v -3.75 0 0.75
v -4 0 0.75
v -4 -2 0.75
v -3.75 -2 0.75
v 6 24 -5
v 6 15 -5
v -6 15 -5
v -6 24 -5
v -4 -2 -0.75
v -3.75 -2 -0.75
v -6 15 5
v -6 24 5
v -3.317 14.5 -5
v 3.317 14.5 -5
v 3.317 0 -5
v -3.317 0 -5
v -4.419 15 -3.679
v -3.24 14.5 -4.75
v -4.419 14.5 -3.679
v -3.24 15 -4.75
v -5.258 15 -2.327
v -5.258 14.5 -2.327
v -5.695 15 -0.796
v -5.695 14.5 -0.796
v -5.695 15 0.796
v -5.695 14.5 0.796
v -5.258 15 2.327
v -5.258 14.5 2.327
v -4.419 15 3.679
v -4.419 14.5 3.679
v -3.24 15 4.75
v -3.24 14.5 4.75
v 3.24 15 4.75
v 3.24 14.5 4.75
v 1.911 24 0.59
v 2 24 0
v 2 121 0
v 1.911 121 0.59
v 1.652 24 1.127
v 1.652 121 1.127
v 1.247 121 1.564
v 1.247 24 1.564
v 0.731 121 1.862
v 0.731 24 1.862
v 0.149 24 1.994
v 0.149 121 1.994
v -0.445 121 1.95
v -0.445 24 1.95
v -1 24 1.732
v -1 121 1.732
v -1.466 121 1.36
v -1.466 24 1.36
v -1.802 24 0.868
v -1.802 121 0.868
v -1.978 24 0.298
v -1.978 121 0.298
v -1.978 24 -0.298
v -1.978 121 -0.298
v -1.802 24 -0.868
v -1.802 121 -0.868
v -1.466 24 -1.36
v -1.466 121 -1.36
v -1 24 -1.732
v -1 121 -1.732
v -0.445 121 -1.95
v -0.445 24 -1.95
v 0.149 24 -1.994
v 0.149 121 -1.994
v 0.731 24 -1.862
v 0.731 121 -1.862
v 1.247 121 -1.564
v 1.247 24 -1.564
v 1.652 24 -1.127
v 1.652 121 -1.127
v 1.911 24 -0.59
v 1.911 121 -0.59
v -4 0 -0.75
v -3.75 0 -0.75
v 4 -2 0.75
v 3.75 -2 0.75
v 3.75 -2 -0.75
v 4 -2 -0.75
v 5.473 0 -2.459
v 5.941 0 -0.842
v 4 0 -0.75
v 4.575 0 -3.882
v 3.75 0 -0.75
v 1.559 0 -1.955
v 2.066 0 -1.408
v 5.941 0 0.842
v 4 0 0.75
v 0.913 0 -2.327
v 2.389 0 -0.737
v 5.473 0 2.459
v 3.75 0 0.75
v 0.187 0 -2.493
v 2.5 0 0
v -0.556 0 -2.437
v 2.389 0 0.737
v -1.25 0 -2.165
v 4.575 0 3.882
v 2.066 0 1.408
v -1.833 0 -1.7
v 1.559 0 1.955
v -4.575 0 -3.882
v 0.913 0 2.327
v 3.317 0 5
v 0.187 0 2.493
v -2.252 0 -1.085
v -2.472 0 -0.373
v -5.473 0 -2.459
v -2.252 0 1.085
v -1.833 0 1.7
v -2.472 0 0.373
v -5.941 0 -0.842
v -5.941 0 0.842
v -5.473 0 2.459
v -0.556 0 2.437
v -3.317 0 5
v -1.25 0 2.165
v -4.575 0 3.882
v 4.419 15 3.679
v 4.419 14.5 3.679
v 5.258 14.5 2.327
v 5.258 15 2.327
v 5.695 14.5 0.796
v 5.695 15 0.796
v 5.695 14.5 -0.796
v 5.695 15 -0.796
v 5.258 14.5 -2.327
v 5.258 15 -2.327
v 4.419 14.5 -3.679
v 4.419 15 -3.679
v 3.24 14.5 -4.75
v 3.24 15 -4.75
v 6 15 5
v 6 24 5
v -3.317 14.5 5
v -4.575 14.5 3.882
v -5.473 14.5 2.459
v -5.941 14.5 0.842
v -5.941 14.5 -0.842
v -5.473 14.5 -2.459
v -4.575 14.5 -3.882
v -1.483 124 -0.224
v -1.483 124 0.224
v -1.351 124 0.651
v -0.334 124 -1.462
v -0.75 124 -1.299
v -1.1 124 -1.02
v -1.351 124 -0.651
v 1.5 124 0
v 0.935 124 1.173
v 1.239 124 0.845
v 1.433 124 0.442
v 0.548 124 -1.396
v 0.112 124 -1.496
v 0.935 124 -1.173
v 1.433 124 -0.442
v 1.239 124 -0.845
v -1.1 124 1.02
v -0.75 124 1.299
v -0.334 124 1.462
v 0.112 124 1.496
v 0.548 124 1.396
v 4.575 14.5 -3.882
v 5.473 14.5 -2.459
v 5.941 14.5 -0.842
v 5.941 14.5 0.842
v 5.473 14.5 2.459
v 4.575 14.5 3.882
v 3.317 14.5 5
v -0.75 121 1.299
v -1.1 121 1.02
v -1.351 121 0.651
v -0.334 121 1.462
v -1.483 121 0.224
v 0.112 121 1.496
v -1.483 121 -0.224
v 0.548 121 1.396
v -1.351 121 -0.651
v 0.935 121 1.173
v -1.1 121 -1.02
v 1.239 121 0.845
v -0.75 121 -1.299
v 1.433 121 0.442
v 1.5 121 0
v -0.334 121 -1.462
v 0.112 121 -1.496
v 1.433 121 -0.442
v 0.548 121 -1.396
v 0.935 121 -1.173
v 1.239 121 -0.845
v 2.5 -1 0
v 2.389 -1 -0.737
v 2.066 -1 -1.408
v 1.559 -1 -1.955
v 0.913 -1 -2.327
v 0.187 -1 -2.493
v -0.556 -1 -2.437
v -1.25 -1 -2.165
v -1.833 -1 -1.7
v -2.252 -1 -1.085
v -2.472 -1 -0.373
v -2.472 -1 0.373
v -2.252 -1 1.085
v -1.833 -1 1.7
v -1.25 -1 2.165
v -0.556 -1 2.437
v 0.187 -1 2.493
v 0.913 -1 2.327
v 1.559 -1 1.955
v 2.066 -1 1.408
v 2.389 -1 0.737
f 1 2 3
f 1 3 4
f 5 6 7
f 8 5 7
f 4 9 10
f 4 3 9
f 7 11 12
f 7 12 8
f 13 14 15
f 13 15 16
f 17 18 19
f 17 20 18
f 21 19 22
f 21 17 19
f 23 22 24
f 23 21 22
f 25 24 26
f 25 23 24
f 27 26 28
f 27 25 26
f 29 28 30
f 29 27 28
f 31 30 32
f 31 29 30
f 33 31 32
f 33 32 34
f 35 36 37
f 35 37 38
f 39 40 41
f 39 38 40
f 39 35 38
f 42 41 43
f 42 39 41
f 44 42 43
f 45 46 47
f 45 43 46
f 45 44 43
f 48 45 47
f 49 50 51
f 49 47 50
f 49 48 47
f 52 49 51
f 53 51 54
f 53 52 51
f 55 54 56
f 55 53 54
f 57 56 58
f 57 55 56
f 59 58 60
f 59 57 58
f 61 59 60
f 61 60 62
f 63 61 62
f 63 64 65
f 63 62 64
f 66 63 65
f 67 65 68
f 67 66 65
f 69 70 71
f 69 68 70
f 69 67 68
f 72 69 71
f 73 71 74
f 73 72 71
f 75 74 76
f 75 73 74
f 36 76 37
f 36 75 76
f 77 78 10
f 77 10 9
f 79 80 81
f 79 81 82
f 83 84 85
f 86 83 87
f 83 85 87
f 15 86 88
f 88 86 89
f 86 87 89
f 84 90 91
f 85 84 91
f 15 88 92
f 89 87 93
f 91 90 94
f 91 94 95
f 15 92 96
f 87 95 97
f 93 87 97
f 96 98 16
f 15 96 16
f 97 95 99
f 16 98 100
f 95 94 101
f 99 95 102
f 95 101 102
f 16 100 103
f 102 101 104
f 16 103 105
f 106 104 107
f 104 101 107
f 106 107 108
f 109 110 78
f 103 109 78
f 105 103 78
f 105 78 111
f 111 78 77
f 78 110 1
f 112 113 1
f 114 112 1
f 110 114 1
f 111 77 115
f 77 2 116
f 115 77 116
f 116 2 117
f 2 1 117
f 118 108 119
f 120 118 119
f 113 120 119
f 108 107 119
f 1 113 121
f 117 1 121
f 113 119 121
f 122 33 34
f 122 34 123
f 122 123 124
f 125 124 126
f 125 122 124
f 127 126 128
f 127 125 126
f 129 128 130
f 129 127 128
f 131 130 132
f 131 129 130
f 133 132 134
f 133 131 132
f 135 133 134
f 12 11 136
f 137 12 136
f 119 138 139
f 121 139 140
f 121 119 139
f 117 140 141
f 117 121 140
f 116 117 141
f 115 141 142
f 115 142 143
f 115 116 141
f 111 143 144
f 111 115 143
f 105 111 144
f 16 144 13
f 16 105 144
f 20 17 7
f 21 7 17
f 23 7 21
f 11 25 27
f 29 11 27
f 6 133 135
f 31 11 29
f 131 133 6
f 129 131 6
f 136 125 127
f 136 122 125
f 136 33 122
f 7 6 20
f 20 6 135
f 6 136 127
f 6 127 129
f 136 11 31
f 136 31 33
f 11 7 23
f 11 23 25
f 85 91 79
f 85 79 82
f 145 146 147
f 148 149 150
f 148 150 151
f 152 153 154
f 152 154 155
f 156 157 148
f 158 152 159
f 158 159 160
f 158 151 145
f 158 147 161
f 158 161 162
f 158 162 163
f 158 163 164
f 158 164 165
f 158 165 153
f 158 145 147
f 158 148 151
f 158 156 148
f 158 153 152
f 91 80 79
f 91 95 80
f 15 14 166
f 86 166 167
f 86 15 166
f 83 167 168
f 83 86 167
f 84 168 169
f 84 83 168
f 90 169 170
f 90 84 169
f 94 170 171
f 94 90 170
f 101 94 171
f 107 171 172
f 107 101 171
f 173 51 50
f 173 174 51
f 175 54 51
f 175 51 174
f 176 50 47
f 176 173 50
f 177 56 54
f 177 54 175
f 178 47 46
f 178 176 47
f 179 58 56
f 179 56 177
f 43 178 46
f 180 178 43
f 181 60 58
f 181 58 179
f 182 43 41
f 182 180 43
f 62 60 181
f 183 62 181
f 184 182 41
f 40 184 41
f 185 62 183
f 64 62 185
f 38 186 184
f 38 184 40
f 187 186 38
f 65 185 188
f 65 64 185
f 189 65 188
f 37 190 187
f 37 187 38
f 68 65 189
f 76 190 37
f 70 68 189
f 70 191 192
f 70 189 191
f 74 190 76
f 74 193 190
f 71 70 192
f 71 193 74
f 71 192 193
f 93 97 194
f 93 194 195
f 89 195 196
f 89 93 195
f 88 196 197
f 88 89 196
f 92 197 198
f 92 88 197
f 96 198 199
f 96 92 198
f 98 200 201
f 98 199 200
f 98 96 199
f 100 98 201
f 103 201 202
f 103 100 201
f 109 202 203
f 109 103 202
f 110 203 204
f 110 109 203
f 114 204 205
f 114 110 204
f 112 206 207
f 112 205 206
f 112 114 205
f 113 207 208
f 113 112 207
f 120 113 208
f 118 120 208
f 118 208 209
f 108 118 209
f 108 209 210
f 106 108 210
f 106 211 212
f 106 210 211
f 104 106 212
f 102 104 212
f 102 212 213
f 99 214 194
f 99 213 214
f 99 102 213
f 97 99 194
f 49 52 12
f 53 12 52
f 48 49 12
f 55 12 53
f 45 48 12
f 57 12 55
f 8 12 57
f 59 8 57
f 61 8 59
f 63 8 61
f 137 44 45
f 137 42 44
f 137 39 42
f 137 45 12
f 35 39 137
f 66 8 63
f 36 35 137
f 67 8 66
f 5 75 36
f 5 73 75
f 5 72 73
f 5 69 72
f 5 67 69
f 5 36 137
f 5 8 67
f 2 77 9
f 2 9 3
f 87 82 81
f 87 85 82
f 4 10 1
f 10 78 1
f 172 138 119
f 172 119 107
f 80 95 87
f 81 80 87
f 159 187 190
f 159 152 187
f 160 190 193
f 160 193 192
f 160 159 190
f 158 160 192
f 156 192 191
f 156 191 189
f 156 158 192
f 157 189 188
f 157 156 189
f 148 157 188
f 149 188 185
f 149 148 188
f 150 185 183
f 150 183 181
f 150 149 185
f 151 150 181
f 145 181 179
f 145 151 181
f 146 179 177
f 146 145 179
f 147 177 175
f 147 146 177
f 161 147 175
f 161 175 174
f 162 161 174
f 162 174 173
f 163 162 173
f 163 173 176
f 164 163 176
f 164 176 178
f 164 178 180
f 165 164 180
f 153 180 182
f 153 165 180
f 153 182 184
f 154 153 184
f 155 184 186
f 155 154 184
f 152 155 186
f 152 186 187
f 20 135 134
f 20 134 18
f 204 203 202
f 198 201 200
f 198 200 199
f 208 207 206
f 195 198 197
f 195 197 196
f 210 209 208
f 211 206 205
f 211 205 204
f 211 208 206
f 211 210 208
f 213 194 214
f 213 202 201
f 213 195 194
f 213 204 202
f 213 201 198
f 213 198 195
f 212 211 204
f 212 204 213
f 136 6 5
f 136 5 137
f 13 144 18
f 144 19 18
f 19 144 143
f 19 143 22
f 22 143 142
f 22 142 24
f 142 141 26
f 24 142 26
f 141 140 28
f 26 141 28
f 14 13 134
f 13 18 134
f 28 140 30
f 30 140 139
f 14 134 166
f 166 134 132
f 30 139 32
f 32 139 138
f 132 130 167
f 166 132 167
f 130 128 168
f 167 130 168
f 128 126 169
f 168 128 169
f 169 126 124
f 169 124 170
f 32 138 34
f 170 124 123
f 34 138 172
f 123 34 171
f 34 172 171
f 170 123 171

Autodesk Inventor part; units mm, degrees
ref_plane "YZ Plane" through (0, 0, 0) normal (1, 0, 0) x (0, 1, 0)
ref_plane "XZ Plane" through (0, 0, 0) normal (0, 1, 0) x (-1, 0, 0)
ref_plane "XY Plane" through (0, 0, 0) normal (0, 0, 1) x (1, 0, 0)
sketch "スケッチ1" plane through (0, 0, 0) normal (0, 1, 0) x (-1, 0, 0)
  circle A0 centre (0, 0) radius 6
  line L0 (3.3166, 5) -> (-3.3166, 5)
  line L1 (-3.3166, 5) -> (-3.3166, -5)
  line L2 (-3.3166, -5) -> (3.3166, -5)
  line L3 (3.3166, -5) -> (3.3166, 5)
  dimension "d0" = 12
  dimension "d1" = 10
extrude "押し出し1" add sketch "スケッチ1" along normal blind 15 contours A0 L3 | L3 L2 L1 L0 | L1 A0
sketch "スケッチ2" plane through (0, 0, 0) normal (0, -1, 0) x (1, 0, 0)
  circle A0 centre (0, 0) radius 2.5
  dimension "d4" = 5
extrude "押し出し2" add sketch "スケッチ2" along normal blind 1
sketch "スケッチ3" plane through (0, 0, 0) normal (0, -1, 0) x (1, 0, 0)
  line L0 (4, -0.75) -> (-4, -0.75)
  line L1 (-4, -0.75) -> (-4, 0.75)
  line L2 (-4, 0.75) -> (4, 0.75)
  line L3 (4, 0.75) -> (4, -0.75)
  line L4 (3.75, -0.75) -> (-3.75, -0.75)
  line L5 (-3.75, -0.75) -> (-3.75, 0.75)
  line L6 (-3.75, 0.75) -> (3.75, 0.75)
  line L7 (3.75, 0.75) -> (3.75, -0.75)
  point P0 (0, 0)
  point P1 (4, 0)
  point P2 (0, -0.75)
  point P3 (0, 0.75)
  dimension "d7" = 8
  dimension "d8" = 1.5
  dimension "d9" = 7.5
extrude "押し出し3" add sketch "スケッチ3" along normal blind 2 contours L0 L7 L2 L3 | L0 L1 L2 L5
sketch "スケッチ4" plane through (0, 15, 0) normal (0, 1, 0) x (1, 0, 0)
  line L0 (-6, 5) -> (6, 5)
  line L1 (6, 5) -> (6, -5)
  line L2 (6, -5) -> (-6, -5)
  line L3 (-6, -5) -> (-6, 5)
  line L4 (3.3166, 5) -> (-3.3166, 5) projected
  arc A0 (3.3166, -5) -> (3.3166, 5) centre (0, 0) ccw projected
  arc A1 (-3.3166, 5) -> (-3.3166, -5) centre (0, 0) ccw projected
  line L5 (-3.3166, -5) -> (3.3166, -5) projected
extrude "押し出し4" add sketch "スケッチ4" along normal blind 9
sketch "スケッチ5" plane through (0, 24, 0) normal (0, 1, 0) x (1, 0, 0)
  circle A0 centre (0, 0) radius 2
  dimension "d14" = 4
extrude "押し出し5" add sketch "スケッチ5" along normal blind 100
sketch "スケッチ6" plane through (0, 15, 0) normal (0, -1, 0) x (1, 0, 0)
  arc A0 (6, 0) -> (3.3166, 5) centre (0, 0) ccw projected
  line L0 (6, 5) -> (6, 0) projected
  line L1 (3.3166, 5) -> (6, 5) projected
  arc A1 (3.3166, -5) -> (6, 0) centre (0, 0) ccw projected
  line L2 (6, -5) -> (3.3166, -5) projected
  line L3 (6, 0) -> (6, -5) projected
  arc A2 (-6, 0) -> (-3.3166, -5) centre (0, 0) ccw projected
  line L4 (-6, -5) -> (-6, 0) projected
  line L5 (-3.3166, -5) -> (-6, -5) projected
  arc A3 (-3.3166, 5) -> (-6, 0) centre (0, 0) ccw projected
  line L6 (-6, 5) -> (-3.3166, 5) projected
  line L7 (-6, 0) -> (-6, 5) projected
  circle A4 centre (0, 0) radius 2 projected
  line L8 (-6, -5) -> (-6, 5) projected
  line L9 (-6, 5) -> (6, 5) projected
  line L10 (6, 5) -> (6, -5) projected
  line L11 (6, -5) -> (-6, -5) projected
  circle A5 centre (0, 0) radius 5.75
  line L12 (3.2404, -4.75) -> (-3.2404, -4.75)
  line L13 (-3.2404, -4.75) -> (-3.2404, 4.75)
  line L14 (-3.2404, 4.75) -> (3.2404, 4.75)
  line L15 (3.2404, 4.75) -> (3.2404, -4.75)
  point P0 (-3.3166, -5)
  point P1 (3.3166, -5)
  dimension "d17" = 11.5
  dimension "d18" = 9.5
extrude "押し出し6" cut sketch "スケッチ6" along normal blind 0.5 contours A1 L11 A5 L9 A0 | A0 L1 L0 | L3 L2 A1 | A5 L14 L9 | L11 A5 L12 | A5 L11 A2 A3 L9 | A3 L7 L6 | L5 L4 A2
sketch "スケッチ7" plane through (0, 124, 0) normal (0, 1, 0) x (1, 0, 0)
  circle A0 centre (0, 0) radius 2 projected
  circle A1 centre (0, 0) radius 1.5
  dimension "d21" = 3
extrude "押し出し7" cut sketch "スケッチ7" against normal blind 3
properties part number "motor_M4_100" material "アルミニウム 6061"
